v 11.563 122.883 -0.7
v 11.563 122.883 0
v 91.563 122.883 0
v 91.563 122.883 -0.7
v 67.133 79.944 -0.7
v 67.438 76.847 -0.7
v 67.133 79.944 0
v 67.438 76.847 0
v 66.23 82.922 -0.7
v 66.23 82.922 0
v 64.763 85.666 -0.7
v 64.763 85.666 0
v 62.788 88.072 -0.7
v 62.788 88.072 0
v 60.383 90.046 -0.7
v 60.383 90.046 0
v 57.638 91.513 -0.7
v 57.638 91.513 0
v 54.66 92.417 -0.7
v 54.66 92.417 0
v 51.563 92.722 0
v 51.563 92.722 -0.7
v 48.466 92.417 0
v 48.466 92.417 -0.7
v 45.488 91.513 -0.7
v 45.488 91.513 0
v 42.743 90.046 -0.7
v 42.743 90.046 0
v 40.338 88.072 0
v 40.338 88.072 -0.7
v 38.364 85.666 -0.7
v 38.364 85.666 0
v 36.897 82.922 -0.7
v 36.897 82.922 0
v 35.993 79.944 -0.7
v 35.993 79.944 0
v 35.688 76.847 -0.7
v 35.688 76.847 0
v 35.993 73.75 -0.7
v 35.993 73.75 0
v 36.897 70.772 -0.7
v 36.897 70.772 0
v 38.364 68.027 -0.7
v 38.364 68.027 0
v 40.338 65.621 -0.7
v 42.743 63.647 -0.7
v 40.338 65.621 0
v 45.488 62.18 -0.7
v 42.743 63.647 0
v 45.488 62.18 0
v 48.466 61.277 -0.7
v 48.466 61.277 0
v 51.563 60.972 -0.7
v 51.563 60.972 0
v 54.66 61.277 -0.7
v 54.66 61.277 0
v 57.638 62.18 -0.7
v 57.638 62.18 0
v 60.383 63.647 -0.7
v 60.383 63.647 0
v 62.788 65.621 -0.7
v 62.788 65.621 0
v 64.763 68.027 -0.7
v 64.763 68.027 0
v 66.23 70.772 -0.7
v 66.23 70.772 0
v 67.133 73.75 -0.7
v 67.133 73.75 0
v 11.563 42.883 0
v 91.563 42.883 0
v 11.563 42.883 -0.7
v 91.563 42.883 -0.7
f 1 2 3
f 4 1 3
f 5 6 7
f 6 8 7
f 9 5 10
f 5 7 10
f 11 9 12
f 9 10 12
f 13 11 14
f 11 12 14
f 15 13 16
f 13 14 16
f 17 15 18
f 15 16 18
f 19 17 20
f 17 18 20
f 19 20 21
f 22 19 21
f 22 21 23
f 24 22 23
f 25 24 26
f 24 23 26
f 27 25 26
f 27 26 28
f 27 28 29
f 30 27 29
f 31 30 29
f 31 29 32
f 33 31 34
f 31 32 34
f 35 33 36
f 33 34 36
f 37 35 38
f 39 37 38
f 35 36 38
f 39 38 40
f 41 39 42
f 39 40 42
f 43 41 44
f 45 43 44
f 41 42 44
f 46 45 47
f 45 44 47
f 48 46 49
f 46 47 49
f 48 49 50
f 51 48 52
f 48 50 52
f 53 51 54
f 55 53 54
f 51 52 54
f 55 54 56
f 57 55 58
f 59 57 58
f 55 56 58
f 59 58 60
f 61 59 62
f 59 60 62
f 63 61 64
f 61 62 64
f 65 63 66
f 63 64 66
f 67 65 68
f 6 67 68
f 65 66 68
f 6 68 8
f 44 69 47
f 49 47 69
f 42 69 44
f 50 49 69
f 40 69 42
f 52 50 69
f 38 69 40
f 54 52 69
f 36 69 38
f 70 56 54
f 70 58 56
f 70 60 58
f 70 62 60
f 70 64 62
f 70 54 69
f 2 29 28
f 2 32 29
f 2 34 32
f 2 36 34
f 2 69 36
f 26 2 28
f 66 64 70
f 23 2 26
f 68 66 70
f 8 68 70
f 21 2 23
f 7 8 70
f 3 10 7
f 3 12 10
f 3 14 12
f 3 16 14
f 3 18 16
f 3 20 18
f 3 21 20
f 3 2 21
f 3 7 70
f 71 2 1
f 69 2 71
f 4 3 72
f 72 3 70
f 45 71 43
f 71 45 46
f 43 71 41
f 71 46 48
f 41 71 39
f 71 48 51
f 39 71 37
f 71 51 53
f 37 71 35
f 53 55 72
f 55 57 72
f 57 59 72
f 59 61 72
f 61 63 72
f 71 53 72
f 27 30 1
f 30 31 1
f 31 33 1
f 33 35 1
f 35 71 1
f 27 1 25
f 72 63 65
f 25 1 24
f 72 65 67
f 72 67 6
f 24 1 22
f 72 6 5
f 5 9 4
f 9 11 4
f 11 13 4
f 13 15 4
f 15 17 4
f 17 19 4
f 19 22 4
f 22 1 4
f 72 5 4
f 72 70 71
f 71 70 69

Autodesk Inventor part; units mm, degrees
ref_plane "YZ Plane" through (0, 0, 0) normal (1, 0, 0) x (0, 1, 0)
ref_plane "XZ Plane" through (0, 0, 0) normal (0, 1, 0) x (-1, 0, 0)
ref_plane "XY Plane" through (0, 0, 0) normal (0, 0, 1) x (1, 0, 0)
sketch "Sketch1" plane through (0, 0, 0) normal (0, 0, 1) x (1, 0, 0)
  line L0 (-3.4369, 182.883) -> (106.5631, 182.883)
  line L1 (106.5631, 182.883) -> (106.5631, 42.883)
  line L2 (106.5631, 42.883) -> (-3.4369, 42.883)
  line L3 (-3.4369, 42.883) -> (-3.4369, 182.883)
  circle A0 centre (51.5631, 76.8468) radius 15.875
  line L4 (-3.4369, 122.883) -> (106.5631, 122.883)
  line L5 (91.5631, 122.883) -> (91.5631, 42.883)
  line L6 (11.5631, 122.883) -> (11.5631, 42.883)
  point P0 (0, 0)
  point P1 (51.5631, 42.883)
  dimension "d0" = 140
  dimension "d1" = 110
  dimension "d2" = 31.75
  dimension "d5" = 80
  dimension "d6" = 15
  dimension "d7" = 15
extrude "Extrusion1" add sketch "Sketch1" against normal blind 0.7 contours L4 L5 L2 L6
equation "\"d7\" = d6"
properties part number "cage_wall"
